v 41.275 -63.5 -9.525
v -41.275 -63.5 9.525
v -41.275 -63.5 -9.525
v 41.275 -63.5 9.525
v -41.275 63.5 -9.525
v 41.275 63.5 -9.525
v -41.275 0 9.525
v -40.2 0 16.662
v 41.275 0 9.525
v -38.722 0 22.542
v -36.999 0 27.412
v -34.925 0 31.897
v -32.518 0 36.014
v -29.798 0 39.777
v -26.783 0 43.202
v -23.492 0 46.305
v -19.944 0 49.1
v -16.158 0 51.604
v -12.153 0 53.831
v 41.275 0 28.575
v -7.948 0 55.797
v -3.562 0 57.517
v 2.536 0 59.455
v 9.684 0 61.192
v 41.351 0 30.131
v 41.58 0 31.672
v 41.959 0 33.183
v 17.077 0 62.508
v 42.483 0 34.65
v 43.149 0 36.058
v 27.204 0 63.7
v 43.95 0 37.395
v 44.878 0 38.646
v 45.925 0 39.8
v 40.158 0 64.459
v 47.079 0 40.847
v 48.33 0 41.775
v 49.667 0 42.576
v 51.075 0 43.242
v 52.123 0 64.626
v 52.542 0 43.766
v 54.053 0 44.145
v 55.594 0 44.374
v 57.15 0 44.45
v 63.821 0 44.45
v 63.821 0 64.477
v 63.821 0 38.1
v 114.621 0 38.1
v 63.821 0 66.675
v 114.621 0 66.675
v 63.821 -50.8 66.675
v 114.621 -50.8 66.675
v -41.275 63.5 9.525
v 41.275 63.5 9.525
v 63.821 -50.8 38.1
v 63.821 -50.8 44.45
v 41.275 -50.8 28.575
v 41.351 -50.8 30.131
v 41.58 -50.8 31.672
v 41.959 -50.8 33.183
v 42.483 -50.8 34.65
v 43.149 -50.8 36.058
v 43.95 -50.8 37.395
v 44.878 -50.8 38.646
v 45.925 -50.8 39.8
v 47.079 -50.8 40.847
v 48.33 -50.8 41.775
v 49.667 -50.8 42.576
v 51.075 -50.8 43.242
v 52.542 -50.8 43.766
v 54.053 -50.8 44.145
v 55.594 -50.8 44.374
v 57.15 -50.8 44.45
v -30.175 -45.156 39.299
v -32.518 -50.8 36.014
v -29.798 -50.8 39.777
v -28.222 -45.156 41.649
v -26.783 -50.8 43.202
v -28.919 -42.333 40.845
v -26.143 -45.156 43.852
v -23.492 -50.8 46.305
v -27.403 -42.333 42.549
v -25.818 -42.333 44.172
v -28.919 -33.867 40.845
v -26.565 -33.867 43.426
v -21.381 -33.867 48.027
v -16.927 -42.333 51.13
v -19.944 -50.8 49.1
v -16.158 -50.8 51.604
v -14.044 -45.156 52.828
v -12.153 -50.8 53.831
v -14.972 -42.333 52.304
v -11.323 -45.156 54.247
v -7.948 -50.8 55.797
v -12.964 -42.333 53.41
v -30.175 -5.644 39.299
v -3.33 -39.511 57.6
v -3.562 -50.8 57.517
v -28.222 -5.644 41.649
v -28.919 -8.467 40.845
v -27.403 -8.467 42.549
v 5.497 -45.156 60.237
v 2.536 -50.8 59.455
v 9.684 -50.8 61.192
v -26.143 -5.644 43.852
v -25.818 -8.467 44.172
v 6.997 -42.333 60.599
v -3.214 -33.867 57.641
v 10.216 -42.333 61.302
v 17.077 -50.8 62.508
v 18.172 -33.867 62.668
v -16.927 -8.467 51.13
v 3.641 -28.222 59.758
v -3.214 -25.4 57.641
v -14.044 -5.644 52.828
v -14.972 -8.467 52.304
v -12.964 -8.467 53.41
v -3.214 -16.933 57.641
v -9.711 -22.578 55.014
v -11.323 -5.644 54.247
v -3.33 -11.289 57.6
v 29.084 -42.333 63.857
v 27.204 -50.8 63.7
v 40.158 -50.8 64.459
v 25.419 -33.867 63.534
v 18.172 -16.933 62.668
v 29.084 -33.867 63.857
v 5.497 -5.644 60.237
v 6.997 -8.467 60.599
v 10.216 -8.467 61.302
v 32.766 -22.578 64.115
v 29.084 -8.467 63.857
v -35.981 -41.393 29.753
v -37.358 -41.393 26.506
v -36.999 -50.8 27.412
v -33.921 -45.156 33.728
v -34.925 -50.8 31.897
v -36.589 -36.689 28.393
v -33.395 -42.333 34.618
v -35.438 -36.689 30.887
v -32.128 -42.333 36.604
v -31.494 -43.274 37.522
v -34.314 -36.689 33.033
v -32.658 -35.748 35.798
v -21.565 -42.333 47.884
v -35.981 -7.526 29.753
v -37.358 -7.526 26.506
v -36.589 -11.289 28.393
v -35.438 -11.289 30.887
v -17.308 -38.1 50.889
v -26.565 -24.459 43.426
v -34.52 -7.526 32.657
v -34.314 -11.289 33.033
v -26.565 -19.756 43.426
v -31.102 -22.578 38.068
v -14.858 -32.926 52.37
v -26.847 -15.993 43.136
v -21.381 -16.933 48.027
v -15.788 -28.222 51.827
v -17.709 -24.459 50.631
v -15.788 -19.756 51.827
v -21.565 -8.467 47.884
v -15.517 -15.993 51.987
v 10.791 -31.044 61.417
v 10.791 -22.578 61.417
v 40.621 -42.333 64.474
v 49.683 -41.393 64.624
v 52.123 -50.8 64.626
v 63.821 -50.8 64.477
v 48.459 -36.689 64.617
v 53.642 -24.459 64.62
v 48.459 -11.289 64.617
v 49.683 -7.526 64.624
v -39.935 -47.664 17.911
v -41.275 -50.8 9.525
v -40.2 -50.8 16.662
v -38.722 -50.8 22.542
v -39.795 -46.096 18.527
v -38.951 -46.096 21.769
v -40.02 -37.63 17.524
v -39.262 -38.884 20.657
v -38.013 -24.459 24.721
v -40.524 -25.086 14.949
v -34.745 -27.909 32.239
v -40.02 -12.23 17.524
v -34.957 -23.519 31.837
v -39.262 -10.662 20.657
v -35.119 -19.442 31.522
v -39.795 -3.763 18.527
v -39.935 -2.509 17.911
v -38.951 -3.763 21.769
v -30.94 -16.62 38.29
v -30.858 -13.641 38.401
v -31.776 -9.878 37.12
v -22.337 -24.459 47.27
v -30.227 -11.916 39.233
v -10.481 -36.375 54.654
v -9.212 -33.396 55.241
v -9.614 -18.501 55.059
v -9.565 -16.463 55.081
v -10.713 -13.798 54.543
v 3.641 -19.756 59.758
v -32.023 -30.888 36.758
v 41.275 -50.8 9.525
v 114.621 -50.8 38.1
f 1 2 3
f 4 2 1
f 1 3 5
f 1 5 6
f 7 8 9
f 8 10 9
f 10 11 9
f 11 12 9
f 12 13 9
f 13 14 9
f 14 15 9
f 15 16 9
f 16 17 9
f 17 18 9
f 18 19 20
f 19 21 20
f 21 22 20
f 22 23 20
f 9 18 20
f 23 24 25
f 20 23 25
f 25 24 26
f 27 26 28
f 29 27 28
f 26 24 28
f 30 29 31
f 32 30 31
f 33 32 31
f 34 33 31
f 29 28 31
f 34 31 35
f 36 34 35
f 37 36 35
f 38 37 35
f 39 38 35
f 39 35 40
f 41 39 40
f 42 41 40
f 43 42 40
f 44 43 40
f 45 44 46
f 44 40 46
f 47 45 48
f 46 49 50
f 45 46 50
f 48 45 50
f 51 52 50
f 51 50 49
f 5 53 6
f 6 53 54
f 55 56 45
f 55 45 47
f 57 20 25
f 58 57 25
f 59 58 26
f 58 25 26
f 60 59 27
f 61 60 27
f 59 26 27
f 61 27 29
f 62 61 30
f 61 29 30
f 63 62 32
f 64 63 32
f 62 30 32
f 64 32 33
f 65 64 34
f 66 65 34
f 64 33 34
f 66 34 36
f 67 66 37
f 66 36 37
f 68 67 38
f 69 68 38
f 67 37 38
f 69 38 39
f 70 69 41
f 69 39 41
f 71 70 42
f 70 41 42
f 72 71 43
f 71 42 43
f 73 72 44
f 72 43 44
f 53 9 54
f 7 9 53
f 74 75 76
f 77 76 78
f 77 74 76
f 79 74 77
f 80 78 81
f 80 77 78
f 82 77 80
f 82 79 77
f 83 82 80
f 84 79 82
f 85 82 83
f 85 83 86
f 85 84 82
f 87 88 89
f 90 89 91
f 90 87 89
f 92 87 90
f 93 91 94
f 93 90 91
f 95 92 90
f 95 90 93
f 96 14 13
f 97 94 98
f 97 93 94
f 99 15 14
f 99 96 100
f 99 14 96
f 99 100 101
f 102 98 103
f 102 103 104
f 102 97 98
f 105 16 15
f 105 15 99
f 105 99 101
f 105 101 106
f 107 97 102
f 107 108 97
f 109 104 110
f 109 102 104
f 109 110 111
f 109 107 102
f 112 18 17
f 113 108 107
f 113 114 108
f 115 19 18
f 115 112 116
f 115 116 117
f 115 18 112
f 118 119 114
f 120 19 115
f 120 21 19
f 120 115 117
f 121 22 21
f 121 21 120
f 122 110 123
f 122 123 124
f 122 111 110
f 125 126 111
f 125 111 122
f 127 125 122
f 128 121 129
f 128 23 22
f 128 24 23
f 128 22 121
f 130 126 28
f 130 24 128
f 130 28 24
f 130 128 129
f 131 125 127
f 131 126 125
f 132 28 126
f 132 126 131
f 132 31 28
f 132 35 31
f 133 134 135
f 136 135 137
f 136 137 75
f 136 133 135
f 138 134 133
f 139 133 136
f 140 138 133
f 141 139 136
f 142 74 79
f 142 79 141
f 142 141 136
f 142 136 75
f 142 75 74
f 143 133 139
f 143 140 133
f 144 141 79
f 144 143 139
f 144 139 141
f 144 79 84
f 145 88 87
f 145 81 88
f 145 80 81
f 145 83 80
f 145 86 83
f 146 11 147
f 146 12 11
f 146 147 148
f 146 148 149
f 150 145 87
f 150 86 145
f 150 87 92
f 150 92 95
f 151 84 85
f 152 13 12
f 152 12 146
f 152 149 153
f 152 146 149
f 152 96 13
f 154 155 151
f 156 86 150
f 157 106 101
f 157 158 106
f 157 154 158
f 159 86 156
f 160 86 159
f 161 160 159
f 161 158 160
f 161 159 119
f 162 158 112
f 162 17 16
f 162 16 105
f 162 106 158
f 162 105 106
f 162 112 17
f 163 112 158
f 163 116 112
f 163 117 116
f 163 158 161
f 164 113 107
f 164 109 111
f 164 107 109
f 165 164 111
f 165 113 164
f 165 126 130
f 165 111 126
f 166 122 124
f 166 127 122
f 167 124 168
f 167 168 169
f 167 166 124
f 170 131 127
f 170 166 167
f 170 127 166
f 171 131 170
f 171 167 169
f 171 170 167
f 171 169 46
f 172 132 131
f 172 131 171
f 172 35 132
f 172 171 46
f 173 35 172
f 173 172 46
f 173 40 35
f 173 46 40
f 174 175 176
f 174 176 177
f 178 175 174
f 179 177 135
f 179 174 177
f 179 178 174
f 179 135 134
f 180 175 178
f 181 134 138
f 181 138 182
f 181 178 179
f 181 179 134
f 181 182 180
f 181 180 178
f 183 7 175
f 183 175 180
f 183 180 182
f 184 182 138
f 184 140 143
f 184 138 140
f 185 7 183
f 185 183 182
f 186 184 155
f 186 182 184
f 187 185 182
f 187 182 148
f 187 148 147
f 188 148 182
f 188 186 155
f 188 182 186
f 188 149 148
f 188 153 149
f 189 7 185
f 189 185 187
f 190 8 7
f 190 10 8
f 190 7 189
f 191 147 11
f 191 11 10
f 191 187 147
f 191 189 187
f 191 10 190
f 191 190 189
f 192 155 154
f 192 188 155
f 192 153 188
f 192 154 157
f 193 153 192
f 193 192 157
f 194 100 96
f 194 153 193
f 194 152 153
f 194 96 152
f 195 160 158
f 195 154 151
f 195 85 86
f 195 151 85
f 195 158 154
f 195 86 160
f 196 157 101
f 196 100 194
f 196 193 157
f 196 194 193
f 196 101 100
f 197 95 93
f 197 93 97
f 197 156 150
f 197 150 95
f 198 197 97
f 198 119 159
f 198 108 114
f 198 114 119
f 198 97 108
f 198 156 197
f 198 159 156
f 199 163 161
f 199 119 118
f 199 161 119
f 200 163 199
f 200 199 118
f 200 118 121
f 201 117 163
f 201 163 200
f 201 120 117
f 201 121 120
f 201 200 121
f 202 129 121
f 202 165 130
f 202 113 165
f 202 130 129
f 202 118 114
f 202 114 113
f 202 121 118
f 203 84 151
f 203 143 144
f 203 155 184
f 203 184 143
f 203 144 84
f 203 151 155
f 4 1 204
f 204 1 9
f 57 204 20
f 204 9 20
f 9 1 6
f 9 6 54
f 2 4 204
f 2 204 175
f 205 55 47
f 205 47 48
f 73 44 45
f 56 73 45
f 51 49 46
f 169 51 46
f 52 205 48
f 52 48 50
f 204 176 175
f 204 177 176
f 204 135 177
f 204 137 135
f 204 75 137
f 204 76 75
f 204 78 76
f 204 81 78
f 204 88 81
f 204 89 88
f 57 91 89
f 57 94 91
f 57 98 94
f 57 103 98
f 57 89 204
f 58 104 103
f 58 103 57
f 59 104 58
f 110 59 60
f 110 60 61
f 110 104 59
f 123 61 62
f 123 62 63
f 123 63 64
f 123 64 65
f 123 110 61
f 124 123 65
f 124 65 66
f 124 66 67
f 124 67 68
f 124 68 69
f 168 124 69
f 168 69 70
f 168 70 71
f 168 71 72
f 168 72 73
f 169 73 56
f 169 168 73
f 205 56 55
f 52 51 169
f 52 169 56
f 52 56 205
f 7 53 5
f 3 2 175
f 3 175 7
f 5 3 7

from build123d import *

# Parameters (mm, degrees)
F1_DEPTH = 63.5
F2_DEPTH = 50.8


with BuildPart() as f1:
    # F0 (on Front) → F1 (new body, symmetric)
    with BuildSketch(Plane.XZ):
        Polygon((-41.275, 9.525), (-41.275, -9.525), (41.275, -9.525), (41.275, 9.525), (22.4790014327, 9.525), align=None)
    extrude(amount=F1_DEPTH, both=True)

    # F0 (on Front) → F2 (join)
    with BuildSketch(Plane.XZ):
        Polygon((-41.275, 9.525), (-41.275, -9.525), (41.275, -9.525), (41.275, 9.525), (22.4790014327, 9.525), align=None)
        with BuildLine():
            add(Edge.make_bspline(
                [(-41.275, 9.525), (-35.7326114907, 63.6337083014), (19.6466617219, 65.4086383739), (63.8208144069, 64.4769455383)],
                knots=[0, 0, 0, 0, 117.4701032347, 117.4701032347, 117.4701032347, 117.4701032347], degree=3))
            Line((-41.275, 9.525), (22.4790014327, 9.525))
            Line((22.4790014327, 9.525), (22.4790014327, 47.0458286018))
            ThreePointArc((22.4790014327, 47.0458286018), (28.8618939863, 60.471876969), (43.3038324118, 63.9975693303))
            Line((43.3038324118, 63.9975693303), (63.8208144069, 63.9975693303))
            Line((63.8208144069, 63.9975693303), (63.8208144069, 64.4769455383))
        make_face()
        with BuildLine():
            Line((22.4790014327, 9.525), (41.275, 9.525))
            Line((41.275, 9.525), (41.275, 28.575))
            ThreePointArc((41.275, 28.575), (45.9246798487, 39.8003201513), (57.15, 44.45))
            Line((57.15, 44.45), (63.8208144069, 44.45))
            Line((63.8208144069, 44.45), (63.8208144069, 63.9975693303))
            Line((63.8208144069, 63.9975693303), (43.3038324118, 63.9975693303))
            ThreePointArc((43.3038324118, 63.9975693303), (28.8618939863, 60.471876969), (22.4790014327, 47.0458286018))
            Line((22.4790014327, 47.0458286018), (22.4790014327, 9.525))
        make_face()
        with BuildLine():
            add(Edge.make_bspline(
                [(63.8208144069, 64.4769455383), (71.9097851364, 64.3063381669), (79.6230338842, 64.0449742774), (86.5857569244, 63.9975693303)],
                knots=[117.4701032347, 117.4701032347, 117.4701032347, 117.4701032347, 138.9806963961, 138.9806963961, 138.9806963961, 138.9806963961], degree=3))
            Line((63.8208144069, 64.4769455383), (63.8208144069, 63.9975693303))
            Line((63.8208144069, 63.9975693303), (86.5857569244, 63.9975693303))
        make_face()
        with BuildLine():
            Line((63.8208144069, 66.675), (63.8208144069, 64.4769455383))
            add(Edge.make_bspline(
                [(63.8208144069, 64.4769455383), (71.9097851364, 64.3063381669), (79.6230338842, 64.0449742774), (86.5857569244, 63.9975693303)],
                knots=[117.4701032347, 117.4701032347, 117.4701032347, 117.4701032347, 138.9806963961, 138.9806963961, 138.9806963961, 138.9806963961], degree=3))
            Line((86.5857569244, 63.9975693303), (85.725, 44.45))
            Line((85.725, 44.45), (63.8208144069, 44.45))
            Line((63.8208144069, 44.45), (63.8208144069, 38.1))
            Line((63.8208144069, 38.1), (114.6208144069, 38.1))
            Line((114.6208144069, 38.1), (114.6208144069, 66.675))
            Line((114.6208144069, 66.675), (63.8208144069, 66.675))
        make_face()
        Polygon((86.5857569244, 63.9975693303), (63.8208144069, 63.9975693303), (63.8208144069, 44.45), (85.725, 44.45), align=None)
    extrude(amount=F2_DEPTH)


solid = f1.part
